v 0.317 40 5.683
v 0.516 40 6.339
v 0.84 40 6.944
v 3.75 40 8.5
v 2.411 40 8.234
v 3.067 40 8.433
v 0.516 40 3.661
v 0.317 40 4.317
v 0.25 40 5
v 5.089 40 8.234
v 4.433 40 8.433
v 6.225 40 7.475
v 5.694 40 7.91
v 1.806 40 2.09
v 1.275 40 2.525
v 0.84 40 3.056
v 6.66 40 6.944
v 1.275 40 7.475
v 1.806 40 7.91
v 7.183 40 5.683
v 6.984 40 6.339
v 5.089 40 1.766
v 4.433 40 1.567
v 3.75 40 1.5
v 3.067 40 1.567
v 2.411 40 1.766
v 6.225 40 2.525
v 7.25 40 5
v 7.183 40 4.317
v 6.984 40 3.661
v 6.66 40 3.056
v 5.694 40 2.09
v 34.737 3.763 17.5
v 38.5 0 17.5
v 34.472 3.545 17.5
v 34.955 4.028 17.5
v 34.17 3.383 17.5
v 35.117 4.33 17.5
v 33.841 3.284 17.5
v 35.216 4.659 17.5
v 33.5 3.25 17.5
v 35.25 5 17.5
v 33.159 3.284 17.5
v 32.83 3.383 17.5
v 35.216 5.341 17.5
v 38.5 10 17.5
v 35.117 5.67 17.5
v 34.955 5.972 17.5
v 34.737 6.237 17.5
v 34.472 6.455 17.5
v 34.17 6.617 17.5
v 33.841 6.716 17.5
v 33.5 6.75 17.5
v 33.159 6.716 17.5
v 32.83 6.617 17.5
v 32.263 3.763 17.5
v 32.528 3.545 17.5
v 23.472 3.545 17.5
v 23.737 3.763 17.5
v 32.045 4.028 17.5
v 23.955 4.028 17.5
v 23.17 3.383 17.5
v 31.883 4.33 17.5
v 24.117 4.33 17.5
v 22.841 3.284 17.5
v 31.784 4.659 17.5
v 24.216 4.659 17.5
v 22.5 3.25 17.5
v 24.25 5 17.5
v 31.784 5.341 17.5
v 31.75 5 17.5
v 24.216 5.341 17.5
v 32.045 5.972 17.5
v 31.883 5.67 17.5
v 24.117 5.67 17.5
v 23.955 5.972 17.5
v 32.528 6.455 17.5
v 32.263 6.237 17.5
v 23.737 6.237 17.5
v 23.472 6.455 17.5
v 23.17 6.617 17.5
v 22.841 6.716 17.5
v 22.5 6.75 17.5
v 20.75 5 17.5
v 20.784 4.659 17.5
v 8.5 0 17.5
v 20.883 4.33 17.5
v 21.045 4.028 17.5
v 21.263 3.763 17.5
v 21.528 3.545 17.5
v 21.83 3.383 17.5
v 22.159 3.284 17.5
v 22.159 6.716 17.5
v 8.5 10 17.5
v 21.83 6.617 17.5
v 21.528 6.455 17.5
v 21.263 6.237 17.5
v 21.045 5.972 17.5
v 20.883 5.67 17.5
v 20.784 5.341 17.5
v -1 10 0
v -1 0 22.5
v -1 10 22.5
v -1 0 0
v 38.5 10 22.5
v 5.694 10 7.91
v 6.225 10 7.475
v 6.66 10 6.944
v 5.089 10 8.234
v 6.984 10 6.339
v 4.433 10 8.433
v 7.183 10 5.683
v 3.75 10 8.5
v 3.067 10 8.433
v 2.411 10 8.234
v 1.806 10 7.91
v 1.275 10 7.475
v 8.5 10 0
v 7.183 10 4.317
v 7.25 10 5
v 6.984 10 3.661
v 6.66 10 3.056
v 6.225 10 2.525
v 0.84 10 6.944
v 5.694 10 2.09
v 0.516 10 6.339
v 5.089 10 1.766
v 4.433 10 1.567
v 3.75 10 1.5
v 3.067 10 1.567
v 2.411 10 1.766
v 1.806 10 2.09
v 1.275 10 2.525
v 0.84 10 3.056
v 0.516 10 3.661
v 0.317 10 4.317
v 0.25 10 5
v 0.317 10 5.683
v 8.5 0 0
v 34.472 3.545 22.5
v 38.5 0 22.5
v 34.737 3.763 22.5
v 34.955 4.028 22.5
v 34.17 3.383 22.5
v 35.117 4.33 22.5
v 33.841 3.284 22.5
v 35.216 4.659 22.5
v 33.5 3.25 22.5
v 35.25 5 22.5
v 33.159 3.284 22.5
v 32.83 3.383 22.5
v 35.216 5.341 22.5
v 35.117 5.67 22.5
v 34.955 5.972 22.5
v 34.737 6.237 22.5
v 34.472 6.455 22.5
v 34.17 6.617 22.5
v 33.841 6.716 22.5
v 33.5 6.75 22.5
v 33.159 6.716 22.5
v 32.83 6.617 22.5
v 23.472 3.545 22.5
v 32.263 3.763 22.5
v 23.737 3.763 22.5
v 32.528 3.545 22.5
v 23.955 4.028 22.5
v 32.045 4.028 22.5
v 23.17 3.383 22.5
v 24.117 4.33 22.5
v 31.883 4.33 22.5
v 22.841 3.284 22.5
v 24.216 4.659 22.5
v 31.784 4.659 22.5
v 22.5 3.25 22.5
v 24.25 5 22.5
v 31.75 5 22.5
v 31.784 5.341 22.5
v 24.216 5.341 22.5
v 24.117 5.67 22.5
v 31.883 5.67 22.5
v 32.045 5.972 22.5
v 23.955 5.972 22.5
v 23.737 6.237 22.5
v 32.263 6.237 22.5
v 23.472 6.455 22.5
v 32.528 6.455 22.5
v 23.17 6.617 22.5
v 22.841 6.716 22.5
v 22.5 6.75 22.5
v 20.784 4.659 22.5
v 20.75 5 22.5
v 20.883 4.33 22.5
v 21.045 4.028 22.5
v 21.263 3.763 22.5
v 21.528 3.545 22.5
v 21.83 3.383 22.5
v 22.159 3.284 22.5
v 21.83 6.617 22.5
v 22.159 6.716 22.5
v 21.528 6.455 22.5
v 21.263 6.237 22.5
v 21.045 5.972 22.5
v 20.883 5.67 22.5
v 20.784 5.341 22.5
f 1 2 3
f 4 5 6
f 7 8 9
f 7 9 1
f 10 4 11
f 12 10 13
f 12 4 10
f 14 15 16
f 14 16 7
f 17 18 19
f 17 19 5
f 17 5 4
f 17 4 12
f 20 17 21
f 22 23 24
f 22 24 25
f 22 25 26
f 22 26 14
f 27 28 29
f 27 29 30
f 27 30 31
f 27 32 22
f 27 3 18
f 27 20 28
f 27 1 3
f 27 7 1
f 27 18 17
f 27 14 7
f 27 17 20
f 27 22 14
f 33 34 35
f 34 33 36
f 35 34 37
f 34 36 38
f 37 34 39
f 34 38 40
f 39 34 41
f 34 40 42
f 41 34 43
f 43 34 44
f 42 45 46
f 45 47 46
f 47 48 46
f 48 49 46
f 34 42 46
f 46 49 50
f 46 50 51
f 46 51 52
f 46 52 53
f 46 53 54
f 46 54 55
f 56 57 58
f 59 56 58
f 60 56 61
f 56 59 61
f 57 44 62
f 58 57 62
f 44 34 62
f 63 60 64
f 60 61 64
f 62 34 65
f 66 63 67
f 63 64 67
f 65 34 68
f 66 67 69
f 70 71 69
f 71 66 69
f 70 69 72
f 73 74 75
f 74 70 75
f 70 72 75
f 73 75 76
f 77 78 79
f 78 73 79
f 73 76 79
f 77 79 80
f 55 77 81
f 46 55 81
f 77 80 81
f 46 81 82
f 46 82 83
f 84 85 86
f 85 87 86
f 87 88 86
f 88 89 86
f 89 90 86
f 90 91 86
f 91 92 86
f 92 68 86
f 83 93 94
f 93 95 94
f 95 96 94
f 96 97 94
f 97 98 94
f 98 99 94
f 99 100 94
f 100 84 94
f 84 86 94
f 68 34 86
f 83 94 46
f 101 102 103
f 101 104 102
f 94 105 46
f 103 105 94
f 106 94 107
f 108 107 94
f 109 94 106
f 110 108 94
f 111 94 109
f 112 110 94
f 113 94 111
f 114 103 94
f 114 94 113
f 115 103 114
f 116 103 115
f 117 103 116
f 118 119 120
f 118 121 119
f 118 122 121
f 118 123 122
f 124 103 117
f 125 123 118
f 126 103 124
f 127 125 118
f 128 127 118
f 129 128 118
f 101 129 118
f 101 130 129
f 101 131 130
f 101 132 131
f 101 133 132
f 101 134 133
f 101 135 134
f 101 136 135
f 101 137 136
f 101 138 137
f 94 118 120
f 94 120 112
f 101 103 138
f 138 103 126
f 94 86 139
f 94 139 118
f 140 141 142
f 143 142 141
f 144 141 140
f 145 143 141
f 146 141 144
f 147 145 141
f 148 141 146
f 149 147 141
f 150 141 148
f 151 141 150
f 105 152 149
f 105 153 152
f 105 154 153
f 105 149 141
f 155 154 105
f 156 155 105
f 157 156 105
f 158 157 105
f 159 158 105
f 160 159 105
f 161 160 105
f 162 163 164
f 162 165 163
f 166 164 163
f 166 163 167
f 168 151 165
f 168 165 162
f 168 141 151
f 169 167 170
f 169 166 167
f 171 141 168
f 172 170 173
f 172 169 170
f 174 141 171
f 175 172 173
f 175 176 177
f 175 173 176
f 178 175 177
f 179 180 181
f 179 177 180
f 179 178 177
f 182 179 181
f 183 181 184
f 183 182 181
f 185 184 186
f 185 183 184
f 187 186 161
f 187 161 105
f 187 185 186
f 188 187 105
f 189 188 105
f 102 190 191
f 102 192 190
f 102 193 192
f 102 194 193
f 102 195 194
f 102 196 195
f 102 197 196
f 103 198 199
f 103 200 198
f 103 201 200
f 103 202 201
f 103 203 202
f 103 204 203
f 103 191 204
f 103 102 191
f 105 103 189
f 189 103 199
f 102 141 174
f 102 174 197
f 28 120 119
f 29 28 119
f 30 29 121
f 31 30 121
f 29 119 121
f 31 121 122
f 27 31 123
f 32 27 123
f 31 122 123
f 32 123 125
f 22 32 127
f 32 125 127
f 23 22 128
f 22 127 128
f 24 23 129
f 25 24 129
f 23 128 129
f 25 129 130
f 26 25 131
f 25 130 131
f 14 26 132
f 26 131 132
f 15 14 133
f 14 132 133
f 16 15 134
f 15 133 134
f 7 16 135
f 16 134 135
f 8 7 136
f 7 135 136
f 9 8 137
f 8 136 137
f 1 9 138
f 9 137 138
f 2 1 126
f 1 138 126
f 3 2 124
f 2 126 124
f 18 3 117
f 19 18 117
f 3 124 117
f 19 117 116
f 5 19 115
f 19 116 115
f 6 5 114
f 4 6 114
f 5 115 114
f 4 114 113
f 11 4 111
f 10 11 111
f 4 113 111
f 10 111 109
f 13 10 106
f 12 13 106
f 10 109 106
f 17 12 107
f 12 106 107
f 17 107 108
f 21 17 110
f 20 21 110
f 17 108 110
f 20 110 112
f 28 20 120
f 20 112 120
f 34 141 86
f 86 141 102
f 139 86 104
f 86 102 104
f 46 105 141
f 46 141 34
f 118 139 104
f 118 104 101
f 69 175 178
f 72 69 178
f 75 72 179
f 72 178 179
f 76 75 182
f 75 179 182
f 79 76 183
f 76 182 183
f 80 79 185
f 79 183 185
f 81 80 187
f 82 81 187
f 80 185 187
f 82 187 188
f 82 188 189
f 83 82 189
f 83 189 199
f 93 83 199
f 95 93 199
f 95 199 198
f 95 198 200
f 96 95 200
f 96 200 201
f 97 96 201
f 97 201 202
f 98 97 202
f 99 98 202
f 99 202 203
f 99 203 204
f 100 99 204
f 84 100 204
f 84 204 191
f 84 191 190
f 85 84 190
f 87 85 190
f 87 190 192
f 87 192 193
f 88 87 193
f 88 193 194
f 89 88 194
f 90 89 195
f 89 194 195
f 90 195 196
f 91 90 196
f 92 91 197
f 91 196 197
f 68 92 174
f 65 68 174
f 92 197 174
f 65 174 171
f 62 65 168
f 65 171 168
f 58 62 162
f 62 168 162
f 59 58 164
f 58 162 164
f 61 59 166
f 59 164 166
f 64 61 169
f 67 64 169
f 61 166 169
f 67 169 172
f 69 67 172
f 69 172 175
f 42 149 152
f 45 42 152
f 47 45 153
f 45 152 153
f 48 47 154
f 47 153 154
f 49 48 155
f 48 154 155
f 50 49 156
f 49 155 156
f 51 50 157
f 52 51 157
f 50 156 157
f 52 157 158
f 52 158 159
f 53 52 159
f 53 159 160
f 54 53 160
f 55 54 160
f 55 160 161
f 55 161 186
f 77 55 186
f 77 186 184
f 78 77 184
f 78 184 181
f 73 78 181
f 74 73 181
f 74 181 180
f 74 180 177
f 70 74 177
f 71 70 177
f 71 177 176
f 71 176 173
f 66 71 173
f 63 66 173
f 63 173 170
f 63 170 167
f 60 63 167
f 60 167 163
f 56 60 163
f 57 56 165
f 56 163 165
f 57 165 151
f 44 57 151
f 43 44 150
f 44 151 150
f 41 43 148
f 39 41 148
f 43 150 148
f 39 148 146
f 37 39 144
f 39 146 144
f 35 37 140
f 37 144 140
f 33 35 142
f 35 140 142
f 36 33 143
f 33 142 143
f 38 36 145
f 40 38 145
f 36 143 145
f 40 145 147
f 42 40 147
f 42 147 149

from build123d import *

# Parameters (mm, degrees)
SKETCH1_W           = 12.5
SKETCH1_H           = 10
BOSS_EXTRUDE1_DEPTH = 10
SKETCH2_W           = 10
SKETCH2_H           = 10
BOSS_EXTRUDE2_DEPTH = 5
SKETCH3_R           = 3.5
BOSS_EXTRUDE3_DEPTH = 30
SKETCH4_W           = 4
SKETCH4_H           = 10
CUT_EXTRUDE1_DEPTH  = 11
SKETCH5_W           = 9.5
SKETCH5_H           = 10
BOSS_EXTRUDE4_DEPTH = 12.5
SKETCH6_W           = 5
SKETCH6_H           = 10
BOSS_EXTRUDE5_DEPTH = 30
SKETCH7_R           = 1.75
CUT_EXTRUDE2_DEPTH  = 23.5


with BuildPart() as part:
    # Sketch1 → Boss-Extrude1 (new body)
    with BuildSketch(Plane.XY):
        with Locations((6.25, 5)):
            Rectangle(SKETCH1_W, SKETCH1_H)
    extrude(amount=BOSS_EXTRUDE1_DEPTH)

    # Sketch2 → Boss-Extrude2 (add)
    with BuildSketch(Plane.ZY):
        with Locations((5, 5)):
            Rectangle(SKETCH2_W, SKETCH2_H)
    extrude(amount=BOSS_EXTRUDE2_DEPTH)

    # Sketch3 → Boss-Extrude3 (add)
    with BuildSketch(Plane(origin=(0, 10, 0), x_dir=(1, 0, 0), z_dir=(0, 1, 0))):
        with Locations((3.75, -5)):
            Circle(SKETCH3_R)
    extrude(amount=BOSS_EXTRUDE3_DEPTH)

    # Sketch4 → Cut-Extrude1 (cut, through all)
    with BuildSketch(Plane(origin=(0, 10, 0), x_dir=(1, 0, 0), z_dir=(0, 1, 0))):
        with Locations((10.5, -5)):
            Rectangle(SKETCH4_W, SKETCH4_H)
        with Locations((-3, -5)):
            Rectangle(SKETCH4_W, SKETCH4_H)
    extrude(amount=-CUT_EXTRUDE1_DEPTH, mode=Mode.SUBTRACT)

    # Sketch5 → Boss-Extrude4 (add)
    with BuildSketch(Plane.XY.offset(10)):
        with Locations((3.75, 5)):
            Rectangle(SKETCH5_W, SKETCH5_H)
    extrude(amount=BOSS_EXTRUDE4_DEPTH)

    # Sketch6 → Boss-Extrude5 (add)
    with BuildSketch(Plane(origin=(8.5, 0, 0), x_dir=(0, 0, -1), z_dir=(1, 0, 0))):
        with Locations((-20, 5)):
            Rectangle(SKETCH6_W, SKETCH6_H)
    extrude(amount=BOSS_EXTRUDE5_DEPTH)

    # Sketch7 → Cut-Extrude2 (cut, through all)
    with BuildSketch(Plane.XY.offset(22.5)):
        with Locations((22.5, 5)):
            Circle(SKETCH7_R)
        with Locations((33.5, 5)):
            Circle(SKETCH7_R)
    extrude(amount=-CUT_EXTRUDE2_DEPTH, mode=Mode.SUBTRACT)


solid = part.part
